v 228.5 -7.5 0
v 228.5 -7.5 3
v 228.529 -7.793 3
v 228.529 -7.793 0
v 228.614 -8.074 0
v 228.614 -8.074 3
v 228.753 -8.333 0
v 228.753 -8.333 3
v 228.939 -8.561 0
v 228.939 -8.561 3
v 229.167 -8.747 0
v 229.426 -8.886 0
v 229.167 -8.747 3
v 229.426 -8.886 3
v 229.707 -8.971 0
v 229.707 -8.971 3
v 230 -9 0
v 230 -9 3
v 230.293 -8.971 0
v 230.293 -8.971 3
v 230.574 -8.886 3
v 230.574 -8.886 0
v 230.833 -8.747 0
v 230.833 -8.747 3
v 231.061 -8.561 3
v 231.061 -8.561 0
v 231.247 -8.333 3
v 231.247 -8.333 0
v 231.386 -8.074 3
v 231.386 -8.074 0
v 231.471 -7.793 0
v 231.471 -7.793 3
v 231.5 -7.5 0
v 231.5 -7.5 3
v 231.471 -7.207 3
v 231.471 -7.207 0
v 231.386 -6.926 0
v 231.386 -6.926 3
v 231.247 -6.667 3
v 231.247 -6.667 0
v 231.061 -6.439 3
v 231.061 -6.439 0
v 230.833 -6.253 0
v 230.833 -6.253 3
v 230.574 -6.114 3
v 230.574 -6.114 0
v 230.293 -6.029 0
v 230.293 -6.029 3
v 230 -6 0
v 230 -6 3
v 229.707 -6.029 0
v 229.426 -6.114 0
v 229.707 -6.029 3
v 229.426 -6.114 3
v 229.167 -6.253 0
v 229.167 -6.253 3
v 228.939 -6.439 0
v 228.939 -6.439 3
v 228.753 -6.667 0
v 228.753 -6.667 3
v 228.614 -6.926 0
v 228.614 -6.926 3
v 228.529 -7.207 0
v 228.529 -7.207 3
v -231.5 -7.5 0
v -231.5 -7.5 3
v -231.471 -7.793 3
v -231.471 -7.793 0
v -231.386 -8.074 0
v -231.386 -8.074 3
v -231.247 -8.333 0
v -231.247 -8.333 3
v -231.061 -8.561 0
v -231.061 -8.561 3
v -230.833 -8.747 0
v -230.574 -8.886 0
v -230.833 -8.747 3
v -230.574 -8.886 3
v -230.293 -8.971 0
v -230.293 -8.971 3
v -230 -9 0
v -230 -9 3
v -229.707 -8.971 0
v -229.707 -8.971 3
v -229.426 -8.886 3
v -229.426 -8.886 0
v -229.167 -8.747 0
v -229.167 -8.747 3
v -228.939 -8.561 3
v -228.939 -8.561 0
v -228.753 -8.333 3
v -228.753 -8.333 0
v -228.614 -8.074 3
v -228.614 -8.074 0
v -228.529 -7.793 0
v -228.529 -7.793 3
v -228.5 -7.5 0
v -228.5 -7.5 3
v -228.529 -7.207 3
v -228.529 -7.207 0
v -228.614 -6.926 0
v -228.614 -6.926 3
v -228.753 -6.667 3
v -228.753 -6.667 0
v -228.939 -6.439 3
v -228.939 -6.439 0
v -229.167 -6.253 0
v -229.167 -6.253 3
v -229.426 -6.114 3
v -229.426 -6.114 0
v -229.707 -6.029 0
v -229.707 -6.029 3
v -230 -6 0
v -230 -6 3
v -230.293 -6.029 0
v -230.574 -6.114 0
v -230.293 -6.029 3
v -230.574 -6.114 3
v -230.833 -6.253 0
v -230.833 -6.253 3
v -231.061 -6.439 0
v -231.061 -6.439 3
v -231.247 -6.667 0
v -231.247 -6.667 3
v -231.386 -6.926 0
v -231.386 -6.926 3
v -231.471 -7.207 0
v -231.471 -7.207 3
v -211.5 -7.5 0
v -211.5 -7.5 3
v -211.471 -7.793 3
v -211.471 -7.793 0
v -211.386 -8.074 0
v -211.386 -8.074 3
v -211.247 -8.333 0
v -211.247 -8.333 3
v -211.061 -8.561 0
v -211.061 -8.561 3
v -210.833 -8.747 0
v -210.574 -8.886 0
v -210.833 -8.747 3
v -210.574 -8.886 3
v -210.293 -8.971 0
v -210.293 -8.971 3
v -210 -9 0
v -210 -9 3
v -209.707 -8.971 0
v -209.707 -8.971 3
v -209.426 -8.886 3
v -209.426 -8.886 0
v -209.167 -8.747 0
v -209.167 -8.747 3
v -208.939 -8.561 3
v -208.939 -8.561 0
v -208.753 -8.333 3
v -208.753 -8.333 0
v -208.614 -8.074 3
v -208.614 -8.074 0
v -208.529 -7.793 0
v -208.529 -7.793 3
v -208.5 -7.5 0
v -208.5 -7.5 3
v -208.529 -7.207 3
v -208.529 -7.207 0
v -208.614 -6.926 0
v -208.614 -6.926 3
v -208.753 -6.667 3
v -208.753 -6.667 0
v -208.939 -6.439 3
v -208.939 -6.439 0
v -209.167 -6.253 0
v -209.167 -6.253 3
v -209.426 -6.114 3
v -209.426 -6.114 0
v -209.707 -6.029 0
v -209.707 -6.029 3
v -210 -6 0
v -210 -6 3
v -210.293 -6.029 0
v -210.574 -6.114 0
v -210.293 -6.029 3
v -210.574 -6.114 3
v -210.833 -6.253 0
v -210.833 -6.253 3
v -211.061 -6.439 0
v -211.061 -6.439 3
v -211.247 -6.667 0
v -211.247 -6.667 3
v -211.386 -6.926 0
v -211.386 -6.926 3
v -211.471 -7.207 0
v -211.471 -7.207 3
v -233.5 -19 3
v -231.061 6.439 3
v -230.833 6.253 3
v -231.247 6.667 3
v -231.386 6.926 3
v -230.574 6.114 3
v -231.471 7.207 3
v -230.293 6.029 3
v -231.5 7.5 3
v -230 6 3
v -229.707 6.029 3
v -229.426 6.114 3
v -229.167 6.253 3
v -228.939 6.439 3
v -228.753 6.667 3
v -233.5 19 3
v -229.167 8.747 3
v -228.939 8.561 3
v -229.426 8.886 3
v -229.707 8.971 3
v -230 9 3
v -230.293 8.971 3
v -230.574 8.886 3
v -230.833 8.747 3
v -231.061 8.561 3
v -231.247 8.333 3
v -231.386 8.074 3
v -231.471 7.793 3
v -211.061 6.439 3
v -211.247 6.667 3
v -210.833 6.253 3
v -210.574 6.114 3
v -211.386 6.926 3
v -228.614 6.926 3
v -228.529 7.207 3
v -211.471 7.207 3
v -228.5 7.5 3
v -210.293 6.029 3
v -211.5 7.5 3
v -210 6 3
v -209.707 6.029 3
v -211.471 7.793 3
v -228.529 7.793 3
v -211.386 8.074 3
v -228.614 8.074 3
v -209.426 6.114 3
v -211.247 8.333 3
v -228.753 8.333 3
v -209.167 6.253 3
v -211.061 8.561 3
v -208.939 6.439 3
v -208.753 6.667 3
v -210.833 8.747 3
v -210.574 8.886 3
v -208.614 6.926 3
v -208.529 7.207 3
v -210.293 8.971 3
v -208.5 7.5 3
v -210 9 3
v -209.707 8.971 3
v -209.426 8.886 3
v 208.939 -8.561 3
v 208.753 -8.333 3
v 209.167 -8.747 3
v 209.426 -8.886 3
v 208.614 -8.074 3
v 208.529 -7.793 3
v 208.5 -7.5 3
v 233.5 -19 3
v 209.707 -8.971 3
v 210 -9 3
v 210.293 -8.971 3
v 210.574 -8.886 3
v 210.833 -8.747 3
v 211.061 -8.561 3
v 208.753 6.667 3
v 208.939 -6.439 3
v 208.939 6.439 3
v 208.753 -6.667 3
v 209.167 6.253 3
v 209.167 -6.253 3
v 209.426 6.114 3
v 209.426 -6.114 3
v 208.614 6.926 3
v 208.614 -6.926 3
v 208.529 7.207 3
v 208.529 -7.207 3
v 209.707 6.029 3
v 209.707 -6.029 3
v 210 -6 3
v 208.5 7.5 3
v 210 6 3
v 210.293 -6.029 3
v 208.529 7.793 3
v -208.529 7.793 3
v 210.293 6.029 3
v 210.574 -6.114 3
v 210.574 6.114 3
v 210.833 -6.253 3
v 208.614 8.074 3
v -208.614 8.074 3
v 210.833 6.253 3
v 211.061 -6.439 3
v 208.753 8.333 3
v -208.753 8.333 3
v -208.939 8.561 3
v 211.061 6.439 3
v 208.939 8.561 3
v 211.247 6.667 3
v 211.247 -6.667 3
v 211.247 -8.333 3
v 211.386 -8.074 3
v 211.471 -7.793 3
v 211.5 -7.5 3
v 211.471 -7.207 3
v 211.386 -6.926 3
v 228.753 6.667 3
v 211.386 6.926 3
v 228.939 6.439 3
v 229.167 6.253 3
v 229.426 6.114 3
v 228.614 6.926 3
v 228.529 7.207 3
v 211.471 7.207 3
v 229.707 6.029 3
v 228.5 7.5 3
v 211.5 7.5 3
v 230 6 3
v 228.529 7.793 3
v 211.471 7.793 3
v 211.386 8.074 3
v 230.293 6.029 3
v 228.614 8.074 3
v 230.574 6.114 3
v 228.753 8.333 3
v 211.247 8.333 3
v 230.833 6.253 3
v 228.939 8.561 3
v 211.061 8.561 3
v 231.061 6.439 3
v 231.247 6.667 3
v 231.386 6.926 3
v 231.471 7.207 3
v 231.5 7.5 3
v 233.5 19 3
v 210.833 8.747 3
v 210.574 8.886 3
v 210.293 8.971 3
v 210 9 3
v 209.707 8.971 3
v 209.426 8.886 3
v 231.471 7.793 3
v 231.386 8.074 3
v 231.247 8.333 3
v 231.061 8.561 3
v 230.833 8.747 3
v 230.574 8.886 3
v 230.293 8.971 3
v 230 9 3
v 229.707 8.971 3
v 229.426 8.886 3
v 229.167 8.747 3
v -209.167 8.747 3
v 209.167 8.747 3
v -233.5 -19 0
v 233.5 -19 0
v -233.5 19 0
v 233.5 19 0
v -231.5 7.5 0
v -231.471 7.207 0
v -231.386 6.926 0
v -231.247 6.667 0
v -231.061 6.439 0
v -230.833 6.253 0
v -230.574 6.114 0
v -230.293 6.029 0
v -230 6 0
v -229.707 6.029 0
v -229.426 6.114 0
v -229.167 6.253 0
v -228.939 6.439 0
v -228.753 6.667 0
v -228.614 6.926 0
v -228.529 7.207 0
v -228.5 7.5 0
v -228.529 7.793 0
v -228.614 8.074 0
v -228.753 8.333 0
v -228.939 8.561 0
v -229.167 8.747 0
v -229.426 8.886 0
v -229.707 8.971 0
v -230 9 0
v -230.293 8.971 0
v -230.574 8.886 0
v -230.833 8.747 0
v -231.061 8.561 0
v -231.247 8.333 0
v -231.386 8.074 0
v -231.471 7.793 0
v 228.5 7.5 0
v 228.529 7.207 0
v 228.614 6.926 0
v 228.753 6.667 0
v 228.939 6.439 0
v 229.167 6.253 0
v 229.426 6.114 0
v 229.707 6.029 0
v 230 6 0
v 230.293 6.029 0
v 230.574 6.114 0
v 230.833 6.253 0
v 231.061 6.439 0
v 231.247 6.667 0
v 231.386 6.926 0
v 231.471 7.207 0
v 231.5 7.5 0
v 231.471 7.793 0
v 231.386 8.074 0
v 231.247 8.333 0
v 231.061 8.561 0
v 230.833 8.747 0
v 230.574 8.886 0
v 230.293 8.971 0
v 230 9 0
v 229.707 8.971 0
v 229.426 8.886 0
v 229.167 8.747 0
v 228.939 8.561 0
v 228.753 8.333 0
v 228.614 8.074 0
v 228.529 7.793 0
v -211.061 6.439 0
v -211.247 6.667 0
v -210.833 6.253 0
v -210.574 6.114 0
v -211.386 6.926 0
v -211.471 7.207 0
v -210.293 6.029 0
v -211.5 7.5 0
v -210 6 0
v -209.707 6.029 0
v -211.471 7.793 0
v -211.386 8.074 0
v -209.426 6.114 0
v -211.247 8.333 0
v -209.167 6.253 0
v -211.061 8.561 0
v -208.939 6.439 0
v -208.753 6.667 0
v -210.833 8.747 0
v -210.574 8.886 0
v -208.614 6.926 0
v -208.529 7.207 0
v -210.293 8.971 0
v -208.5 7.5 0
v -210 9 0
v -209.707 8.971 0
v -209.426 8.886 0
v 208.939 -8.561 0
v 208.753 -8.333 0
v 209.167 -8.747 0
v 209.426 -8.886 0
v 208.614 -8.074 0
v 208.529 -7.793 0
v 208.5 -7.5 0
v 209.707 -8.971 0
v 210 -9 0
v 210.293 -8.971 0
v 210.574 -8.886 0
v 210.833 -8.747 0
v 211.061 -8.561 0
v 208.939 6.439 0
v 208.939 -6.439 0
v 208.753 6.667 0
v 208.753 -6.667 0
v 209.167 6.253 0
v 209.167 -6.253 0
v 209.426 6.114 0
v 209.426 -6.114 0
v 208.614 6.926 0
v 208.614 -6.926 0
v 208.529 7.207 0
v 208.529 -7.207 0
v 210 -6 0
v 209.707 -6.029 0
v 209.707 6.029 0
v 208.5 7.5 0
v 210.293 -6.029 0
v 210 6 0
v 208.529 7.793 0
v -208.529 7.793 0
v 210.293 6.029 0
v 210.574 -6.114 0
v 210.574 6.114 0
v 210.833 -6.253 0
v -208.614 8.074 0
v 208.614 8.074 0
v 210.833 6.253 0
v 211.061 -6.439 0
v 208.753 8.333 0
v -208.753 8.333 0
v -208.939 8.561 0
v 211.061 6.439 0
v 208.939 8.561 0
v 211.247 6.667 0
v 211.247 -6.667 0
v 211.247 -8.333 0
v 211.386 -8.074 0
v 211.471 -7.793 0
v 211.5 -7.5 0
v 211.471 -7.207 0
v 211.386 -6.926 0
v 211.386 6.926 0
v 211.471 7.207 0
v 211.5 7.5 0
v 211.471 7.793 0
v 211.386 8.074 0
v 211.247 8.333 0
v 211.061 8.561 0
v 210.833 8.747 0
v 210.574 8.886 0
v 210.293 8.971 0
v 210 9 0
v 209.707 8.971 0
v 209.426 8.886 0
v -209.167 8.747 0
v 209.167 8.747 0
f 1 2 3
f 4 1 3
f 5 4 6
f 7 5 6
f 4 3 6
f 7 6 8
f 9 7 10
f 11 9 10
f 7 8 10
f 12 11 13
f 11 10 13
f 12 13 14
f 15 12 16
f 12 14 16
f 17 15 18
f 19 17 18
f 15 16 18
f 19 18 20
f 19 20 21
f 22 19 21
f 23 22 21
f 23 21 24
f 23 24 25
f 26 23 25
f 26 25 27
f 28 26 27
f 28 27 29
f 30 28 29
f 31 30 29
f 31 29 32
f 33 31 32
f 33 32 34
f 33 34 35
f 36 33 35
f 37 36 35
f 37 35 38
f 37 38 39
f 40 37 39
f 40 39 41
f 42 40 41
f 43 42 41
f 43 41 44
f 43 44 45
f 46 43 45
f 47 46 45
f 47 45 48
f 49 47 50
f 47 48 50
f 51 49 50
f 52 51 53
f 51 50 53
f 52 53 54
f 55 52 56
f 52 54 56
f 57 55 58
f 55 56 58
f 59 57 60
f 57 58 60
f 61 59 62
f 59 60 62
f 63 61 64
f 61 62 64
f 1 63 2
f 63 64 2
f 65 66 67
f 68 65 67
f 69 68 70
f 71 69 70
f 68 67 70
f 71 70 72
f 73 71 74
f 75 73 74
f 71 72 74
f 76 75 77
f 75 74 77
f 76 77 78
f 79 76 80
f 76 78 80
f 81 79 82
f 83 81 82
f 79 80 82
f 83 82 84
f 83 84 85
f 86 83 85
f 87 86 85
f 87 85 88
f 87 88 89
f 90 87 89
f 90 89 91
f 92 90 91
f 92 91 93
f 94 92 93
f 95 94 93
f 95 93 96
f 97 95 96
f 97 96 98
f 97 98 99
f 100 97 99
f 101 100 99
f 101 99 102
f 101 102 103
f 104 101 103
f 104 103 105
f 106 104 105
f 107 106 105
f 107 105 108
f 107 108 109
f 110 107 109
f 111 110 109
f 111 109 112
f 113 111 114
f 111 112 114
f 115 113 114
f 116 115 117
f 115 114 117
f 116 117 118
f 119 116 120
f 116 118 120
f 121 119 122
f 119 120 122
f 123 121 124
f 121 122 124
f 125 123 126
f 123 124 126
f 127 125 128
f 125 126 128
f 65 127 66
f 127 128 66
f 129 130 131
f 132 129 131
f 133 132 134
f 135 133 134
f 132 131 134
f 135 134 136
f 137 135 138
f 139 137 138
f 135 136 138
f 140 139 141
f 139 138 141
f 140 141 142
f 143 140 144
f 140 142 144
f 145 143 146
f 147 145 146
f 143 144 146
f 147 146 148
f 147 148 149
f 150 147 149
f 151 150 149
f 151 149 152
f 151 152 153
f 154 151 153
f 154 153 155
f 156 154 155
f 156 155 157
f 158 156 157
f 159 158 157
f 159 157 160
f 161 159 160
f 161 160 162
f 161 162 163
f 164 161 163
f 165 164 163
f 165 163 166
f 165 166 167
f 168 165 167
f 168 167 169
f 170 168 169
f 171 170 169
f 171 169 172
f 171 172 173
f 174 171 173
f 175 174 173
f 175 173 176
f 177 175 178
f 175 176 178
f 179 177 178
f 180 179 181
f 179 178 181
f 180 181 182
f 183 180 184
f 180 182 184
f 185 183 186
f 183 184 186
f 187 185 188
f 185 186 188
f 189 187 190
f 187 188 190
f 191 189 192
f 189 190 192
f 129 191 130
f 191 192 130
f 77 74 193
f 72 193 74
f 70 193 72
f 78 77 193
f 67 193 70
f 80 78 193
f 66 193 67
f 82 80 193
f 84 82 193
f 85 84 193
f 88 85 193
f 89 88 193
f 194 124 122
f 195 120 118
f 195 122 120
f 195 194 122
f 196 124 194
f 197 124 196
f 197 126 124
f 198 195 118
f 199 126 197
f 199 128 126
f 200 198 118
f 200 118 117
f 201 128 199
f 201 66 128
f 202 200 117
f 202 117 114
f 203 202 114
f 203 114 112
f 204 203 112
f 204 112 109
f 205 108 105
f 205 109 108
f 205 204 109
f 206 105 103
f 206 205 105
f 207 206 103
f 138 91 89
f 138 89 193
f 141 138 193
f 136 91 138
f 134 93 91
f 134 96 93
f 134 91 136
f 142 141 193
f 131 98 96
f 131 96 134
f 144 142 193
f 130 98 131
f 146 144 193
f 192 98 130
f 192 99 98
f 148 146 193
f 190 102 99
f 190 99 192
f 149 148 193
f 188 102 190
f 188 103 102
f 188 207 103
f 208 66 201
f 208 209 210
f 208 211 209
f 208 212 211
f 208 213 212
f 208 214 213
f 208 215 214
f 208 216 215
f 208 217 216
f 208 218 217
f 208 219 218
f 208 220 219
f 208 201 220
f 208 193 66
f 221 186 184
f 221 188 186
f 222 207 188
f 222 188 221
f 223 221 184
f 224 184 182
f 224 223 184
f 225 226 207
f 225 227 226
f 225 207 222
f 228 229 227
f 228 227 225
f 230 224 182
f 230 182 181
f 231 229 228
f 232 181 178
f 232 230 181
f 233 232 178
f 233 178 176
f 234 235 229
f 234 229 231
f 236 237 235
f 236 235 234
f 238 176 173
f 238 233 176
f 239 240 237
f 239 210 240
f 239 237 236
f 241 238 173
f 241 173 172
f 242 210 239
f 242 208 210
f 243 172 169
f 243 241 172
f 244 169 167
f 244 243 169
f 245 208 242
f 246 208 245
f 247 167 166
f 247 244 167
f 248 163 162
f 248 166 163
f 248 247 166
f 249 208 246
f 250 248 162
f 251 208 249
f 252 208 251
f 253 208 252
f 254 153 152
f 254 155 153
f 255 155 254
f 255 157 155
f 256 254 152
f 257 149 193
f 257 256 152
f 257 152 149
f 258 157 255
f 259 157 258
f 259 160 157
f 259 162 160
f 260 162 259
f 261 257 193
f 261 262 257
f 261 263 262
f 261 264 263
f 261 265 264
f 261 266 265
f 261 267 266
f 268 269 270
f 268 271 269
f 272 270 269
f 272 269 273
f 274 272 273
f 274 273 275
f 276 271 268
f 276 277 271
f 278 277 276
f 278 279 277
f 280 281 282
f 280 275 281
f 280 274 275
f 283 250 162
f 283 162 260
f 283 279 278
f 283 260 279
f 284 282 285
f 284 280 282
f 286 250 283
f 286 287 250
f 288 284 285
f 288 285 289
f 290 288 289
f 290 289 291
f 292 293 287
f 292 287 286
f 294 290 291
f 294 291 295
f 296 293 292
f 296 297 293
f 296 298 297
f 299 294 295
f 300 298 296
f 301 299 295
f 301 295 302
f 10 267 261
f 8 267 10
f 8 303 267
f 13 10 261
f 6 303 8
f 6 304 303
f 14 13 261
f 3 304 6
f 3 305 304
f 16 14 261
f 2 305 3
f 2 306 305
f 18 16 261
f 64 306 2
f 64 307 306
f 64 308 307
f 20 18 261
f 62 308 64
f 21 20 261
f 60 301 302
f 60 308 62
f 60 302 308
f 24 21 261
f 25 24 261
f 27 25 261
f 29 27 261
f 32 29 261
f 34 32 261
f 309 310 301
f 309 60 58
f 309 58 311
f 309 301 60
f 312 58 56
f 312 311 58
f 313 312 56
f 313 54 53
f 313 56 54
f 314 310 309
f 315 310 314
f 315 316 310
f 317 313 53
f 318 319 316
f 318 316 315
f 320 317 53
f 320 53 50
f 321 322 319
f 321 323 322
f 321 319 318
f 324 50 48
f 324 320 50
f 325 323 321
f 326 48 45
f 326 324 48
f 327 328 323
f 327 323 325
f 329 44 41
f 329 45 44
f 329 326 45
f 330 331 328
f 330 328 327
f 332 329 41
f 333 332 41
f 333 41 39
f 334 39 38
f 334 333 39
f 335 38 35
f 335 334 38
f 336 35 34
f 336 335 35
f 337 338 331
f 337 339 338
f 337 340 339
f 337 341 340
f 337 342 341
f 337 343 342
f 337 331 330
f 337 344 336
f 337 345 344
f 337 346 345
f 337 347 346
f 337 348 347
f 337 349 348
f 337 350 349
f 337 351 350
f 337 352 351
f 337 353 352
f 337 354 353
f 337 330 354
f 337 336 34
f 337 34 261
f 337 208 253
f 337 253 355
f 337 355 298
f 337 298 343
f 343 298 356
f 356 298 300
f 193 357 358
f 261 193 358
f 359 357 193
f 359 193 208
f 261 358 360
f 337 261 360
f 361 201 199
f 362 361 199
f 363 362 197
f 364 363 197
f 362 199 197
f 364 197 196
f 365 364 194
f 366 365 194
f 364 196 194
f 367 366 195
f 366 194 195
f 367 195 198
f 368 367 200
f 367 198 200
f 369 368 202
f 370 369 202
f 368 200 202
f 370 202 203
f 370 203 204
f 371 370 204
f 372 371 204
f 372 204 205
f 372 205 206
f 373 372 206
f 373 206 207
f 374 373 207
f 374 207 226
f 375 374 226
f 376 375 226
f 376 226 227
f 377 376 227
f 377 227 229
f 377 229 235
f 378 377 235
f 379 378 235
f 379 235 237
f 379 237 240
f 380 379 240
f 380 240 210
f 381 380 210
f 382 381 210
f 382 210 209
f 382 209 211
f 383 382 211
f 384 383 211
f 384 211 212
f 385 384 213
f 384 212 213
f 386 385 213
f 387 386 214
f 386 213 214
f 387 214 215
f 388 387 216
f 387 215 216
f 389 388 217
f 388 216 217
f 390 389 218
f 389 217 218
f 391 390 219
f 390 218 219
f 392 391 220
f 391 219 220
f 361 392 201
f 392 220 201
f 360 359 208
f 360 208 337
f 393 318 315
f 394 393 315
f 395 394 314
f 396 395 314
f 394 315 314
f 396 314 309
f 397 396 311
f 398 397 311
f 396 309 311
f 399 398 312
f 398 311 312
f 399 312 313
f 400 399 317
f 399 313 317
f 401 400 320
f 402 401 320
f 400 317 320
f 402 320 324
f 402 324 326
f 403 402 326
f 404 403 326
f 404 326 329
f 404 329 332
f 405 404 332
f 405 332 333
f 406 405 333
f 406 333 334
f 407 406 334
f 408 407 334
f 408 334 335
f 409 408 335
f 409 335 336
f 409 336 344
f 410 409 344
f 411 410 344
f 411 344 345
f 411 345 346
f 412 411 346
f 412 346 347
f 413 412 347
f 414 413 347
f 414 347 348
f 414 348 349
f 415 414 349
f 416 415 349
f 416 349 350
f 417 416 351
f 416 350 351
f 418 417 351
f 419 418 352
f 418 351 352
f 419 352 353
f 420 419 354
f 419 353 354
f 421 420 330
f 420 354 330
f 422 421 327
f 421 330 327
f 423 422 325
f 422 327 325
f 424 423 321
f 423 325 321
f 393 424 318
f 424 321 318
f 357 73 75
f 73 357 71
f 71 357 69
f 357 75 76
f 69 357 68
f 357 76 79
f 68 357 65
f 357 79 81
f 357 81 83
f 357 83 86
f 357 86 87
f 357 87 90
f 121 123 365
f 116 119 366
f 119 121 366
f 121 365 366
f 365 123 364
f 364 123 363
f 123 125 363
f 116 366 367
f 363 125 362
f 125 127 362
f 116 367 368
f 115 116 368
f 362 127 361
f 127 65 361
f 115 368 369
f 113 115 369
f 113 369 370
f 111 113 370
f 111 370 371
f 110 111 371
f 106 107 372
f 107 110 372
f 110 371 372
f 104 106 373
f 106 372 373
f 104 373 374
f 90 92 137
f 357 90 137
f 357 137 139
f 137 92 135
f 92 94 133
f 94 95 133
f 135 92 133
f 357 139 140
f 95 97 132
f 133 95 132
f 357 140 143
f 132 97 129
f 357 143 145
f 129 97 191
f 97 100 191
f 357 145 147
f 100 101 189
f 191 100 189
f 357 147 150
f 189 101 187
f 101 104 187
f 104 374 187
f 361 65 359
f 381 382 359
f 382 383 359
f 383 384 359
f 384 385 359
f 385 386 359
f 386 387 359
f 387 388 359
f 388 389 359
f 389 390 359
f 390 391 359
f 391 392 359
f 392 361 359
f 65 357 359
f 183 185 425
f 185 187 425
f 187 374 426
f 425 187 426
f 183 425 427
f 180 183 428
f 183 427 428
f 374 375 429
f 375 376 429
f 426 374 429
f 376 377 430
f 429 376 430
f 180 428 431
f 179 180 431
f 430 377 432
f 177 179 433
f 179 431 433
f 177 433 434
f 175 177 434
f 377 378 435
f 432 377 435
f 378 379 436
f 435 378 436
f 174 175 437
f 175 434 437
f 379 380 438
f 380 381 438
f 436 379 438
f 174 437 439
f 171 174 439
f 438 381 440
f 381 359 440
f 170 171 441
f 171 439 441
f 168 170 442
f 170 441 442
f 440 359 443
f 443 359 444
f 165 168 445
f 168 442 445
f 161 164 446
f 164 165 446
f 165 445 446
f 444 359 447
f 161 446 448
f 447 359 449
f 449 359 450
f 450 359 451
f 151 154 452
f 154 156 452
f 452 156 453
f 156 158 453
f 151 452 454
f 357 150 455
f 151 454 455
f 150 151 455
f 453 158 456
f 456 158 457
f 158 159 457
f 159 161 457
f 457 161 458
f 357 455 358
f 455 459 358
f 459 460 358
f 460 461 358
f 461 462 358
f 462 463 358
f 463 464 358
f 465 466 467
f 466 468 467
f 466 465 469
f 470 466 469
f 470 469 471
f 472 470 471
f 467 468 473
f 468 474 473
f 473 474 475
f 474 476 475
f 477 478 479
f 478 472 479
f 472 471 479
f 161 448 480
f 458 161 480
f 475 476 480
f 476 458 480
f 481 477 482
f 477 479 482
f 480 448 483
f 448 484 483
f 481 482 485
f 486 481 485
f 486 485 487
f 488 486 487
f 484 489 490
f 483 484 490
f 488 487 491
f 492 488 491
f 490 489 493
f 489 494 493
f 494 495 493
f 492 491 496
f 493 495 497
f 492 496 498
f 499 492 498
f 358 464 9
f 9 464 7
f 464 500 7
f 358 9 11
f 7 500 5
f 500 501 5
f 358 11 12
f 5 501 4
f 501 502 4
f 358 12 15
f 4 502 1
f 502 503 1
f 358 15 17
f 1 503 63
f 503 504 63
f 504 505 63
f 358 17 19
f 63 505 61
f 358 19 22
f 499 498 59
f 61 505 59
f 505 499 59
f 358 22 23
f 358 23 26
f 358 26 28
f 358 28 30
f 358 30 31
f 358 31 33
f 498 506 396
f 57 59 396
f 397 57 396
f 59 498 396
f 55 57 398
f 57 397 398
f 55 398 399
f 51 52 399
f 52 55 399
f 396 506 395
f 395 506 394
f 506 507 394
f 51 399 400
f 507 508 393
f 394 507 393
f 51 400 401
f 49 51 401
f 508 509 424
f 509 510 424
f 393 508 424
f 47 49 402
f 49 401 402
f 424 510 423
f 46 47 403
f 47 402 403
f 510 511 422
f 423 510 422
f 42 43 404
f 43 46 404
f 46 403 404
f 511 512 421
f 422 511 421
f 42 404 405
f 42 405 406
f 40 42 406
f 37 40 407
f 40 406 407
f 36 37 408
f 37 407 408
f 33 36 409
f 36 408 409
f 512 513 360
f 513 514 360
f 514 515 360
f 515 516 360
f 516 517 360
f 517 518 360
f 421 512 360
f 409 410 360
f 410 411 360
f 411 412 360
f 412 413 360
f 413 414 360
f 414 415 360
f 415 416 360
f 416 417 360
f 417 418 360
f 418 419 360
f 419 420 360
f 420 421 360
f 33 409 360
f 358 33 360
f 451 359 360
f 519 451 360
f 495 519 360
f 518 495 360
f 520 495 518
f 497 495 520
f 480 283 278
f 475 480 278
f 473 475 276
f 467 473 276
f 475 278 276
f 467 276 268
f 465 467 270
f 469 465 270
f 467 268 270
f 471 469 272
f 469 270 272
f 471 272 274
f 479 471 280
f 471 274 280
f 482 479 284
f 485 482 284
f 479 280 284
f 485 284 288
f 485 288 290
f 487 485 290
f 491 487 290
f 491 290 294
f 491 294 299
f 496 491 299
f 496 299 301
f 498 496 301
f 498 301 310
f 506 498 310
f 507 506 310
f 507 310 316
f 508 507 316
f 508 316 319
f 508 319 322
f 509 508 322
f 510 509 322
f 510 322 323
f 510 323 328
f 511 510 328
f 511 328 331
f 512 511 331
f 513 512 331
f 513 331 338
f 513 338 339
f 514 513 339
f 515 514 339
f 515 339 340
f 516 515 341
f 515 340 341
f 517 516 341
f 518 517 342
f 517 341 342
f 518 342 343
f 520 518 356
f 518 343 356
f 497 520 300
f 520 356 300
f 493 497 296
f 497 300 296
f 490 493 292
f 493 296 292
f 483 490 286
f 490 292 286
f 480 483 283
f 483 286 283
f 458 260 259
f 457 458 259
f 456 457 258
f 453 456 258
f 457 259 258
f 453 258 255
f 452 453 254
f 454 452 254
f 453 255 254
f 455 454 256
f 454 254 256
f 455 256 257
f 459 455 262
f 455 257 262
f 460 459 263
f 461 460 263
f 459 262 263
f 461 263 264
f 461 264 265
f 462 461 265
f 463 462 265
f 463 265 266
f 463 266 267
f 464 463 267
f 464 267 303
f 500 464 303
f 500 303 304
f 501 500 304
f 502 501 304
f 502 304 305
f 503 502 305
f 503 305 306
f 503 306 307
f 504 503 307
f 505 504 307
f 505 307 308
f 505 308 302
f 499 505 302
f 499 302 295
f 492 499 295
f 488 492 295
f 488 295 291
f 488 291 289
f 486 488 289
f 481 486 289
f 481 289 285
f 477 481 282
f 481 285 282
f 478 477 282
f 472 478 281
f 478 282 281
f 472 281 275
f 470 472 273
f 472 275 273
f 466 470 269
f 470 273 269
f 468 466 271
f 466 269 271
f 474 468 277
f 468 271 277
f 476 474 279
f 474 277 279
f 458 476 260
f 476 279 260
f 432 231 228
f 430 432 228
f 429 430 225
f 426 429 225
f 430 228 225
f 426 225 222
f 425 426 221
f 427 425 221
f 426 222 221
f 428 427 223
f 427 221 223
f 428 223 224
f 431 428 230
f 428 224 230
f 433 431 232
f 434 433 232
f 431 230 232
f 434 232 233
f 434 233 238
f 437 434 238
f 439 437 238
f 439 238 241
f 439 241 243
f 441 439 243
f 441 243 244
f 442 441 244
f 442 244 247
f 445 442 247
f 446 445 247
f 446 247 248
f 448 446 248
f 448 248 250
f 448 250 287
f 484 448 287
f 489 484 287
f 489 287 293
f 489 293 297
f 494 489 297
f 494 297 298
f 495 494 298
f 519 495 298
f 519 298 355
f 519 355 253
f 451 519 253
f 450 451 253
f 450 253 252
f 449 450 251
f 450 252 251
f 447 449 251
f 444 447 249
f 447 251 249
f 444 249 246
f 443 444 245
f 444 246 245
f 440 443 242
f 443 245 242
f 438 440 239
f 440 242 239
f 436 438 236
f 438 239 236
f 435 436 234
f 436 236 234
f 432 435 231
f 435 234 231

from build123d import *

# Parameters (mm, degrees)
F0_W     = 467
F0_H     = 38
F1_DEPTH = 3
F2_D     = 3


# Not quite as in the source:
# - a feature names something its author has since deleted; it is built from what else it names


with BuildPart() as f1:
    # F0 (on Top) → F1 (new body)
    with BuildSketch(Plane.XY):
        Rectangle(F0_W, F0_H)
    extrude(amount=F1_DEPTH)

    # F2 (through all)
    with Locations(Plane(origin=(0, 0, 0), x_dir=(1, 0, 0), z_dir=(0, 0, -1))):
        with Locations((-230, -7.5), (-210, -7.5), (-210, 7.5), (-230, 7.5), (210, -7.5), (230, -7.5), (230, 7.5), (210, 7.5)):
            Hole(F2_D / 2)


solid = f1.part
